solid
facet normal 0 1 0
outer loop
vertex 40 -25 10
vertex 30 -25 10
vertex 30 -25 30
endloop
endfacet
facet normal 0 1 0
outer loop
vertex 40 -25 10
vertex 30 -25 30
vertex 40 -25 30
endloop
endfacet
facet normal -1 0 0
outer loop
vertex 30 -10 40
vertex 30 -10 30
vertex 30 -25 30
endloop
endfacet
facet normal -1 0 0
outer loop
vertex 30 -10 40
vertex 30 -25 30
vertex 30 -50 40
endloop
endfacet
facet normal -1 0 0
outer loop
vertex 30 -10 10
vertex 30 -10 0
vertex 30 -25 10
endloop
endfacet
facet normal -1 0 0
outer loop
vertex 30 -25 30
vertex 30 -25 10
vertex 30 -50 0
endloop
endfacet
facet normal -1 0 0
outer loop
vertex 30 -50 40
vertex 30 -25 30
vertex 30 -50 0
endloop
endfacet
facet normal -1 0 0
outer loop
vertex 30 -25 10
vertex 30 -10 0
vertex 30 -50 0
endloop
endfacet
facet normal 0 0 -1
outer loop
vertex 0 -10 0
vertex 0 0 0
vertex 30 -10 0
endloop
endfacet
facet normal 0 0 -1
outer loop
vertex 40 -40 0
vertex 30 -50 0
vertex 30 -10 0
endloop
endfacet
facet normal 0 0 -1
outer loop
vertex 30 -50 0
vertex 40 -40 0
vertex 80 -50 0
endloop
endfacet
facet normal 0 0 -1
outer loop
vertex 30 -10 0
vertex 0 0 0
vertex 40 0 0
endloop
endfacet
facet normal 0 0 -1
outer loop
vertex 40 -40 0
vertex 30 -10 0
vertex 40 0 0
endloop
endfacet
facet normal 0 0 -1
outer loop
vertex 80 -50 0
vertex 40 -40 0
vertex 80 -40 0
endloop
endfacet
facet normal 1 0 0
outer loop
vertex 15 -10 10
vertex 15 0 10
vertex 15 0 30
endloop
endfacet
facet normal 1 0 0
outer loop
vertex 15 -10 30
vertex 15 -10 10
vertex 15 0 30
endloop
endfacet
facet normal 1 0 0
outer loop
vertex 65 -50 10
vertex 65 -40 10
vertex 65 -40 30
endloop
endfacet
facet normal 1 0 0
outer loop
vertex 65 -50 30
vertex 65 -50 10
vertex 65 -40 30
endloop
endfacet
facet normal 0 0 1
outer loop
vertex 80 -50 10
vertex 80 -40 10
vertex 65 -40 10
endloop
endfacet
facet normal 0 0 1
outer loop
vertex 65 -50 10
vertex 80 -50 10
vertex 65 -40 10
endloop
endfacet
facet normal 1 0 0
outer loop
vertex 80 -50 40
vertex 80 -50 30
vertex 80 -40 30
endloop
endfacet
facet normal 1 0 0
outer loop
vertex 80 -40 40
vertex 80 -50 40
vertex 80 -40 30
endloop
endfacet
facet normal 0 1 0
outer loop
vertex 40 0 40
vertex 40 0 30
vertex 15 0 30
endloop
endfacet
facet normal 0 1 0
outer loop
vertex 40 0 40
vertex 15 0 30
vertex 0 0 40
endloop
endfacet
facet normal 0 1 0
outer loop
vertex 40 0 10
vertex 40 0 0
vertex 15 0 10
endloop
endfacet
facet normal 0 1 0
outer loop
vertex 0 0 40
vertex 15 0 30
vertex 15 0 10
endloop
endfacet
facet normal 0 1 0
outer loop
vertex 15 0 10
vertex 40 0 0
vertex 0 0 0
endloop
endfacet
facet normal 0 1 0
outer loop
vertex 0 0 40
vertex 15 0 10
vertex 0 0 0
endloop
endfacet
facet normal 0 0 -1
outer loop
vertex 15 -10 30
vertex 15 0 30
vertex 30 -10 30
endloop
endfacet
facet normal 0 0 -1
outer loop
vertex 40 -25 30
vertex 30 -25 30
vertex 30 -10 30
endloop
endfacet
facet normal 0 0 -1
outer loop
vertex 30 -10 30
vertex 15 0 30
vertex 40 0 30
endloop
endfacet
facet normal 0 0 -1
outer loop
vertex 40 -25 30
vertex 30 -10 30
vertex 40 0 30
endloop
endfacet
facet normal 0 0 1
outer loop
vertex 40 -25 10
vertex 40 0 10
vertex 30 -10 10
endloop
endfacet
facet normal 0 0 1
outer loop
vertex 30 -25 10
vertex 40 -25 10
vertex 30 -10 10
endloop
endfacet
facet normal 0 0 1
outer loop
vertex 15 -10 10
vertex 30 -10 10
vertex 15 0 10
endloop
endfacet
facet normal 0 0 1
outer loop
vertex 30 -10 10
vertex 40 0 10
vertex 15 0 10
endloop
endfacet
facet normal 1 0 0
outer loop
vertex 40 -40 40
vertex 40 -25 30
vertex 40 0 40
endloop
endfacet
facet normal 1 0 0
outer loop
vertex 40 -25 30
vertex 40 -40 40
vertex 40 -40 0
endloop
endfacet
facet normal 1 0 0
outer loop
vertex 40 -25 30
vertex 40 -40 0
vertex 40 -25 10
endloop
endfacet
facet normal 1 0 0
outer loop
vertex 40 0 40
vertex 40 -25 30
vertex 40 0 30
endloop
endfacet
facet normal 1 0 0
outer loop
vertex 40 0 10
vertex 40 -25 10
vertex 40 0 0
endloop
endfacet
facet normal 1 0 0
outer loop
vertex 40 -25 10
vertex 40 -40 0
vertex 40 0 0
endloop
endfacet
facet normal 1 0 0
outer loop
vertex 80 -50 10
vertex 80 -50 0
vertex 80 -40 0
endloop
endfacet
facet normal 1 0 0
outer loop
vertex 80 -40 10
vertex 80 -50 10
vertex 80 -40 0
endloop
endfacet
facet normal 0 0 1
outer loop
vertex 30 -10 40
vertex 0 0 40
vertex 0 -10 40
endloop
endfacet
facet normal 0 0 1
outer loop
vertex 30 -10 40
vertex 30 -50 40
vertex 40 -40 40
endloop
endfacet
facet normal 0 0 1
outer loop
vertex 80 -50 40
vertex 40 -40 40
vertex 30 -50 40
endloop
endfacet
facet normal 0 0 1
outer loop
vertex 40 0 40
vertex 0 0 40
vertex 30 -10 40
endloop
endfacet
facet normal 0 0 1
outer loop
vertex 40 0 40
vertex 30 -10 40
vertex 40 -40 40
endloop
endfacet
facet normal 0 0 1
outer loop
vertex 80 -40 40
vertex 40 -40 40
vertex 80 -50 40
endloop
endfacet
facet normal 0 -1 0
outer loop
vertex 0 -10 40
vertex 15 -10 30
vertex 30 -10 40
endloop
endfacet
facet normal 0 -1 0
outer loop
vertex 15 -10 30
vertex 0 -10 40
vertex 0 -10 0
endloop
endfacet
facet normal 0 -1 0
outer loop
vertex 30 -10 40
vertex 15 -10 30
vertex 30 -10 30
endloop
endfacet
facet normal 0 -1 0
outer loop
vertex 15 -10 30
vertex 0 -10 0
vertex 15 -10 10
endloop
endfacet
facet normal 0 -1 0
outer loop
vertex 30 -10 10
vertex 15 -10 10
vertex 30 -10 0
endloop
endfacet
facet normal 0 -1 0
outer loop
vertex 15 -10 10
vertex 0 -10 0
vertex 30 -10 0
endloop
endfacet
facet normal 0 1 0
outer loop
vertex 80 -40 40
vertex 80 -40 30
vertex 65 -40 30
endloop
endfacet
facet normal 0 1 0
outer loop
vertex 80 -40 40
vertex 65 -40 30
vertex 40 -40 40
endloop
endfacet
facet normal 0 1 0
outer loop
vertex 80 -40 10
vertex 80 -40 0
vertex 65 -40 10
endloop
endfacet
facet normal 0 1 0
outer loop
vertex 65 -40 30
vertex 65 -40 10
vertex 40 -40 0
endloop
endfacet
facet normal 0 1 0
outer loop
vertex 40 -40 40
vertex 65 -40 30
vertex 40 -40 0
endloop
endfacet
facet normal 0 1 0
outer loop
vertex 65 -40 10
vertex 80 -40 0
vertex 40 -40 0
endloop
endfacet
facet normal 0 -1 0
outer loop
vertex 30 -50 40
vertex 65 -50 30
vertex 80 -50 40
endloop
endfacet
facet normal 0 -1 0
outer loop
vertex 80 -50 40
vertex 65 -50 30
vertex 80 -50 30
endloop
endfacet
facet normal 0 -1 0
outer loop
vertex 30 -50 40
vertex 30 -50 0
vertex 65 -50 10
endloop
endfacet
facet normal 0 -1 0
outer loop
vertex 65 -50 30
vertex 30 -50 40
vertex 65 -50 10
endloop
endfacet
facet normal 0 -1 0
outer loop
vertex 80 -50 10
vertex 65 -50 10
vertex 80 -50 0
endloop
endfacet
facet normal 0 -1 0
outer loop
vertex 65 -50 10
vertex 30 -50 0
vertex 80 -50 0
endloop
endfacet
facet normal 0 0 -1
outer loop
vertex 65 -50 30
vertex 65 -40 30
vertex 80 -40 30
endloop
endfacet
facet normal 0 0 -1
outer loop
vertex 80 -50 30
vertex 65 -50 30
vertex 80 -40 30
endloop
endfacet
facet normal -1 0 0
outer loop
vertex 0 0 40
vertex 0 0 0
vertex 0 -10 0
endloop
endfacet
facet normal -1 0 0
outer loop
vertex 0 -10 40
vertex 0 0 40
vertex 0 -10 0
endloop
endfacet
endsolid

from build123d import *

# Parameters (mm, degrees)
BOSS_EXTRUDE3_DEPTH     = 40
CUT_EXTRUDE1_DEPTH      = 1
CUT_EXTRUDE1_DEPTH_BACK = 25
CUT_EXTRUDE2_DEPTH      = 11


with BuildPart() as part:
    # Sketch4 → Boss-Extrude3 (new body)
    with BuildSketch(Plane.XY):
        Polygon((0, 0), (0, -10), (30, -10), (30, -50), (80, -50), (80, -40), (40, -40), (40, 0), align=None)
    extrude(amount=BOSS_EXTRUDE3_DEPTH)

    # Sketch5 → Cut-Extrude1 (cut, two sides)
    with BuildSketch(Plane(origin=(0, 0, 0), x_dir=(1, 0, 0), z_dir=(0, 1, 0))) as cut_extrude1_sk:
        Polygon((150, -10), (40, -10), (15, -10), (15, -30), (40, -30), (150, -30), (370, -30), (370, -10), align=None)
    extrude(amount=CUT_EXTRUDE1_DEPTH, mode=Mode.SUBTRACT)
    extrude(cut_extrude1_sk.sketch, amount=-CUT_EXTRUDE1_DEPTH_BACK, mode=Mode.SUBTRACT)

    # Sketch6 → Cut-Extrude2 (cut, through all)
    with BuildSketch(Plane(origin=(0, -40, 0), x_dir=(1, 0, 0), z_dir=(0, 1, 0))):
        Polygon((260.880074906, -10), (80, -10), (65, -10), (65, -30), (80, -30), (260.880074906, -30), (622.640224719, -30), (622.640224719, -10), align=None)
    extrude(amount=-CUT_EXTRUDE2_DEPTH, mode=Mode.SUBTRACT)


solid = part.part
